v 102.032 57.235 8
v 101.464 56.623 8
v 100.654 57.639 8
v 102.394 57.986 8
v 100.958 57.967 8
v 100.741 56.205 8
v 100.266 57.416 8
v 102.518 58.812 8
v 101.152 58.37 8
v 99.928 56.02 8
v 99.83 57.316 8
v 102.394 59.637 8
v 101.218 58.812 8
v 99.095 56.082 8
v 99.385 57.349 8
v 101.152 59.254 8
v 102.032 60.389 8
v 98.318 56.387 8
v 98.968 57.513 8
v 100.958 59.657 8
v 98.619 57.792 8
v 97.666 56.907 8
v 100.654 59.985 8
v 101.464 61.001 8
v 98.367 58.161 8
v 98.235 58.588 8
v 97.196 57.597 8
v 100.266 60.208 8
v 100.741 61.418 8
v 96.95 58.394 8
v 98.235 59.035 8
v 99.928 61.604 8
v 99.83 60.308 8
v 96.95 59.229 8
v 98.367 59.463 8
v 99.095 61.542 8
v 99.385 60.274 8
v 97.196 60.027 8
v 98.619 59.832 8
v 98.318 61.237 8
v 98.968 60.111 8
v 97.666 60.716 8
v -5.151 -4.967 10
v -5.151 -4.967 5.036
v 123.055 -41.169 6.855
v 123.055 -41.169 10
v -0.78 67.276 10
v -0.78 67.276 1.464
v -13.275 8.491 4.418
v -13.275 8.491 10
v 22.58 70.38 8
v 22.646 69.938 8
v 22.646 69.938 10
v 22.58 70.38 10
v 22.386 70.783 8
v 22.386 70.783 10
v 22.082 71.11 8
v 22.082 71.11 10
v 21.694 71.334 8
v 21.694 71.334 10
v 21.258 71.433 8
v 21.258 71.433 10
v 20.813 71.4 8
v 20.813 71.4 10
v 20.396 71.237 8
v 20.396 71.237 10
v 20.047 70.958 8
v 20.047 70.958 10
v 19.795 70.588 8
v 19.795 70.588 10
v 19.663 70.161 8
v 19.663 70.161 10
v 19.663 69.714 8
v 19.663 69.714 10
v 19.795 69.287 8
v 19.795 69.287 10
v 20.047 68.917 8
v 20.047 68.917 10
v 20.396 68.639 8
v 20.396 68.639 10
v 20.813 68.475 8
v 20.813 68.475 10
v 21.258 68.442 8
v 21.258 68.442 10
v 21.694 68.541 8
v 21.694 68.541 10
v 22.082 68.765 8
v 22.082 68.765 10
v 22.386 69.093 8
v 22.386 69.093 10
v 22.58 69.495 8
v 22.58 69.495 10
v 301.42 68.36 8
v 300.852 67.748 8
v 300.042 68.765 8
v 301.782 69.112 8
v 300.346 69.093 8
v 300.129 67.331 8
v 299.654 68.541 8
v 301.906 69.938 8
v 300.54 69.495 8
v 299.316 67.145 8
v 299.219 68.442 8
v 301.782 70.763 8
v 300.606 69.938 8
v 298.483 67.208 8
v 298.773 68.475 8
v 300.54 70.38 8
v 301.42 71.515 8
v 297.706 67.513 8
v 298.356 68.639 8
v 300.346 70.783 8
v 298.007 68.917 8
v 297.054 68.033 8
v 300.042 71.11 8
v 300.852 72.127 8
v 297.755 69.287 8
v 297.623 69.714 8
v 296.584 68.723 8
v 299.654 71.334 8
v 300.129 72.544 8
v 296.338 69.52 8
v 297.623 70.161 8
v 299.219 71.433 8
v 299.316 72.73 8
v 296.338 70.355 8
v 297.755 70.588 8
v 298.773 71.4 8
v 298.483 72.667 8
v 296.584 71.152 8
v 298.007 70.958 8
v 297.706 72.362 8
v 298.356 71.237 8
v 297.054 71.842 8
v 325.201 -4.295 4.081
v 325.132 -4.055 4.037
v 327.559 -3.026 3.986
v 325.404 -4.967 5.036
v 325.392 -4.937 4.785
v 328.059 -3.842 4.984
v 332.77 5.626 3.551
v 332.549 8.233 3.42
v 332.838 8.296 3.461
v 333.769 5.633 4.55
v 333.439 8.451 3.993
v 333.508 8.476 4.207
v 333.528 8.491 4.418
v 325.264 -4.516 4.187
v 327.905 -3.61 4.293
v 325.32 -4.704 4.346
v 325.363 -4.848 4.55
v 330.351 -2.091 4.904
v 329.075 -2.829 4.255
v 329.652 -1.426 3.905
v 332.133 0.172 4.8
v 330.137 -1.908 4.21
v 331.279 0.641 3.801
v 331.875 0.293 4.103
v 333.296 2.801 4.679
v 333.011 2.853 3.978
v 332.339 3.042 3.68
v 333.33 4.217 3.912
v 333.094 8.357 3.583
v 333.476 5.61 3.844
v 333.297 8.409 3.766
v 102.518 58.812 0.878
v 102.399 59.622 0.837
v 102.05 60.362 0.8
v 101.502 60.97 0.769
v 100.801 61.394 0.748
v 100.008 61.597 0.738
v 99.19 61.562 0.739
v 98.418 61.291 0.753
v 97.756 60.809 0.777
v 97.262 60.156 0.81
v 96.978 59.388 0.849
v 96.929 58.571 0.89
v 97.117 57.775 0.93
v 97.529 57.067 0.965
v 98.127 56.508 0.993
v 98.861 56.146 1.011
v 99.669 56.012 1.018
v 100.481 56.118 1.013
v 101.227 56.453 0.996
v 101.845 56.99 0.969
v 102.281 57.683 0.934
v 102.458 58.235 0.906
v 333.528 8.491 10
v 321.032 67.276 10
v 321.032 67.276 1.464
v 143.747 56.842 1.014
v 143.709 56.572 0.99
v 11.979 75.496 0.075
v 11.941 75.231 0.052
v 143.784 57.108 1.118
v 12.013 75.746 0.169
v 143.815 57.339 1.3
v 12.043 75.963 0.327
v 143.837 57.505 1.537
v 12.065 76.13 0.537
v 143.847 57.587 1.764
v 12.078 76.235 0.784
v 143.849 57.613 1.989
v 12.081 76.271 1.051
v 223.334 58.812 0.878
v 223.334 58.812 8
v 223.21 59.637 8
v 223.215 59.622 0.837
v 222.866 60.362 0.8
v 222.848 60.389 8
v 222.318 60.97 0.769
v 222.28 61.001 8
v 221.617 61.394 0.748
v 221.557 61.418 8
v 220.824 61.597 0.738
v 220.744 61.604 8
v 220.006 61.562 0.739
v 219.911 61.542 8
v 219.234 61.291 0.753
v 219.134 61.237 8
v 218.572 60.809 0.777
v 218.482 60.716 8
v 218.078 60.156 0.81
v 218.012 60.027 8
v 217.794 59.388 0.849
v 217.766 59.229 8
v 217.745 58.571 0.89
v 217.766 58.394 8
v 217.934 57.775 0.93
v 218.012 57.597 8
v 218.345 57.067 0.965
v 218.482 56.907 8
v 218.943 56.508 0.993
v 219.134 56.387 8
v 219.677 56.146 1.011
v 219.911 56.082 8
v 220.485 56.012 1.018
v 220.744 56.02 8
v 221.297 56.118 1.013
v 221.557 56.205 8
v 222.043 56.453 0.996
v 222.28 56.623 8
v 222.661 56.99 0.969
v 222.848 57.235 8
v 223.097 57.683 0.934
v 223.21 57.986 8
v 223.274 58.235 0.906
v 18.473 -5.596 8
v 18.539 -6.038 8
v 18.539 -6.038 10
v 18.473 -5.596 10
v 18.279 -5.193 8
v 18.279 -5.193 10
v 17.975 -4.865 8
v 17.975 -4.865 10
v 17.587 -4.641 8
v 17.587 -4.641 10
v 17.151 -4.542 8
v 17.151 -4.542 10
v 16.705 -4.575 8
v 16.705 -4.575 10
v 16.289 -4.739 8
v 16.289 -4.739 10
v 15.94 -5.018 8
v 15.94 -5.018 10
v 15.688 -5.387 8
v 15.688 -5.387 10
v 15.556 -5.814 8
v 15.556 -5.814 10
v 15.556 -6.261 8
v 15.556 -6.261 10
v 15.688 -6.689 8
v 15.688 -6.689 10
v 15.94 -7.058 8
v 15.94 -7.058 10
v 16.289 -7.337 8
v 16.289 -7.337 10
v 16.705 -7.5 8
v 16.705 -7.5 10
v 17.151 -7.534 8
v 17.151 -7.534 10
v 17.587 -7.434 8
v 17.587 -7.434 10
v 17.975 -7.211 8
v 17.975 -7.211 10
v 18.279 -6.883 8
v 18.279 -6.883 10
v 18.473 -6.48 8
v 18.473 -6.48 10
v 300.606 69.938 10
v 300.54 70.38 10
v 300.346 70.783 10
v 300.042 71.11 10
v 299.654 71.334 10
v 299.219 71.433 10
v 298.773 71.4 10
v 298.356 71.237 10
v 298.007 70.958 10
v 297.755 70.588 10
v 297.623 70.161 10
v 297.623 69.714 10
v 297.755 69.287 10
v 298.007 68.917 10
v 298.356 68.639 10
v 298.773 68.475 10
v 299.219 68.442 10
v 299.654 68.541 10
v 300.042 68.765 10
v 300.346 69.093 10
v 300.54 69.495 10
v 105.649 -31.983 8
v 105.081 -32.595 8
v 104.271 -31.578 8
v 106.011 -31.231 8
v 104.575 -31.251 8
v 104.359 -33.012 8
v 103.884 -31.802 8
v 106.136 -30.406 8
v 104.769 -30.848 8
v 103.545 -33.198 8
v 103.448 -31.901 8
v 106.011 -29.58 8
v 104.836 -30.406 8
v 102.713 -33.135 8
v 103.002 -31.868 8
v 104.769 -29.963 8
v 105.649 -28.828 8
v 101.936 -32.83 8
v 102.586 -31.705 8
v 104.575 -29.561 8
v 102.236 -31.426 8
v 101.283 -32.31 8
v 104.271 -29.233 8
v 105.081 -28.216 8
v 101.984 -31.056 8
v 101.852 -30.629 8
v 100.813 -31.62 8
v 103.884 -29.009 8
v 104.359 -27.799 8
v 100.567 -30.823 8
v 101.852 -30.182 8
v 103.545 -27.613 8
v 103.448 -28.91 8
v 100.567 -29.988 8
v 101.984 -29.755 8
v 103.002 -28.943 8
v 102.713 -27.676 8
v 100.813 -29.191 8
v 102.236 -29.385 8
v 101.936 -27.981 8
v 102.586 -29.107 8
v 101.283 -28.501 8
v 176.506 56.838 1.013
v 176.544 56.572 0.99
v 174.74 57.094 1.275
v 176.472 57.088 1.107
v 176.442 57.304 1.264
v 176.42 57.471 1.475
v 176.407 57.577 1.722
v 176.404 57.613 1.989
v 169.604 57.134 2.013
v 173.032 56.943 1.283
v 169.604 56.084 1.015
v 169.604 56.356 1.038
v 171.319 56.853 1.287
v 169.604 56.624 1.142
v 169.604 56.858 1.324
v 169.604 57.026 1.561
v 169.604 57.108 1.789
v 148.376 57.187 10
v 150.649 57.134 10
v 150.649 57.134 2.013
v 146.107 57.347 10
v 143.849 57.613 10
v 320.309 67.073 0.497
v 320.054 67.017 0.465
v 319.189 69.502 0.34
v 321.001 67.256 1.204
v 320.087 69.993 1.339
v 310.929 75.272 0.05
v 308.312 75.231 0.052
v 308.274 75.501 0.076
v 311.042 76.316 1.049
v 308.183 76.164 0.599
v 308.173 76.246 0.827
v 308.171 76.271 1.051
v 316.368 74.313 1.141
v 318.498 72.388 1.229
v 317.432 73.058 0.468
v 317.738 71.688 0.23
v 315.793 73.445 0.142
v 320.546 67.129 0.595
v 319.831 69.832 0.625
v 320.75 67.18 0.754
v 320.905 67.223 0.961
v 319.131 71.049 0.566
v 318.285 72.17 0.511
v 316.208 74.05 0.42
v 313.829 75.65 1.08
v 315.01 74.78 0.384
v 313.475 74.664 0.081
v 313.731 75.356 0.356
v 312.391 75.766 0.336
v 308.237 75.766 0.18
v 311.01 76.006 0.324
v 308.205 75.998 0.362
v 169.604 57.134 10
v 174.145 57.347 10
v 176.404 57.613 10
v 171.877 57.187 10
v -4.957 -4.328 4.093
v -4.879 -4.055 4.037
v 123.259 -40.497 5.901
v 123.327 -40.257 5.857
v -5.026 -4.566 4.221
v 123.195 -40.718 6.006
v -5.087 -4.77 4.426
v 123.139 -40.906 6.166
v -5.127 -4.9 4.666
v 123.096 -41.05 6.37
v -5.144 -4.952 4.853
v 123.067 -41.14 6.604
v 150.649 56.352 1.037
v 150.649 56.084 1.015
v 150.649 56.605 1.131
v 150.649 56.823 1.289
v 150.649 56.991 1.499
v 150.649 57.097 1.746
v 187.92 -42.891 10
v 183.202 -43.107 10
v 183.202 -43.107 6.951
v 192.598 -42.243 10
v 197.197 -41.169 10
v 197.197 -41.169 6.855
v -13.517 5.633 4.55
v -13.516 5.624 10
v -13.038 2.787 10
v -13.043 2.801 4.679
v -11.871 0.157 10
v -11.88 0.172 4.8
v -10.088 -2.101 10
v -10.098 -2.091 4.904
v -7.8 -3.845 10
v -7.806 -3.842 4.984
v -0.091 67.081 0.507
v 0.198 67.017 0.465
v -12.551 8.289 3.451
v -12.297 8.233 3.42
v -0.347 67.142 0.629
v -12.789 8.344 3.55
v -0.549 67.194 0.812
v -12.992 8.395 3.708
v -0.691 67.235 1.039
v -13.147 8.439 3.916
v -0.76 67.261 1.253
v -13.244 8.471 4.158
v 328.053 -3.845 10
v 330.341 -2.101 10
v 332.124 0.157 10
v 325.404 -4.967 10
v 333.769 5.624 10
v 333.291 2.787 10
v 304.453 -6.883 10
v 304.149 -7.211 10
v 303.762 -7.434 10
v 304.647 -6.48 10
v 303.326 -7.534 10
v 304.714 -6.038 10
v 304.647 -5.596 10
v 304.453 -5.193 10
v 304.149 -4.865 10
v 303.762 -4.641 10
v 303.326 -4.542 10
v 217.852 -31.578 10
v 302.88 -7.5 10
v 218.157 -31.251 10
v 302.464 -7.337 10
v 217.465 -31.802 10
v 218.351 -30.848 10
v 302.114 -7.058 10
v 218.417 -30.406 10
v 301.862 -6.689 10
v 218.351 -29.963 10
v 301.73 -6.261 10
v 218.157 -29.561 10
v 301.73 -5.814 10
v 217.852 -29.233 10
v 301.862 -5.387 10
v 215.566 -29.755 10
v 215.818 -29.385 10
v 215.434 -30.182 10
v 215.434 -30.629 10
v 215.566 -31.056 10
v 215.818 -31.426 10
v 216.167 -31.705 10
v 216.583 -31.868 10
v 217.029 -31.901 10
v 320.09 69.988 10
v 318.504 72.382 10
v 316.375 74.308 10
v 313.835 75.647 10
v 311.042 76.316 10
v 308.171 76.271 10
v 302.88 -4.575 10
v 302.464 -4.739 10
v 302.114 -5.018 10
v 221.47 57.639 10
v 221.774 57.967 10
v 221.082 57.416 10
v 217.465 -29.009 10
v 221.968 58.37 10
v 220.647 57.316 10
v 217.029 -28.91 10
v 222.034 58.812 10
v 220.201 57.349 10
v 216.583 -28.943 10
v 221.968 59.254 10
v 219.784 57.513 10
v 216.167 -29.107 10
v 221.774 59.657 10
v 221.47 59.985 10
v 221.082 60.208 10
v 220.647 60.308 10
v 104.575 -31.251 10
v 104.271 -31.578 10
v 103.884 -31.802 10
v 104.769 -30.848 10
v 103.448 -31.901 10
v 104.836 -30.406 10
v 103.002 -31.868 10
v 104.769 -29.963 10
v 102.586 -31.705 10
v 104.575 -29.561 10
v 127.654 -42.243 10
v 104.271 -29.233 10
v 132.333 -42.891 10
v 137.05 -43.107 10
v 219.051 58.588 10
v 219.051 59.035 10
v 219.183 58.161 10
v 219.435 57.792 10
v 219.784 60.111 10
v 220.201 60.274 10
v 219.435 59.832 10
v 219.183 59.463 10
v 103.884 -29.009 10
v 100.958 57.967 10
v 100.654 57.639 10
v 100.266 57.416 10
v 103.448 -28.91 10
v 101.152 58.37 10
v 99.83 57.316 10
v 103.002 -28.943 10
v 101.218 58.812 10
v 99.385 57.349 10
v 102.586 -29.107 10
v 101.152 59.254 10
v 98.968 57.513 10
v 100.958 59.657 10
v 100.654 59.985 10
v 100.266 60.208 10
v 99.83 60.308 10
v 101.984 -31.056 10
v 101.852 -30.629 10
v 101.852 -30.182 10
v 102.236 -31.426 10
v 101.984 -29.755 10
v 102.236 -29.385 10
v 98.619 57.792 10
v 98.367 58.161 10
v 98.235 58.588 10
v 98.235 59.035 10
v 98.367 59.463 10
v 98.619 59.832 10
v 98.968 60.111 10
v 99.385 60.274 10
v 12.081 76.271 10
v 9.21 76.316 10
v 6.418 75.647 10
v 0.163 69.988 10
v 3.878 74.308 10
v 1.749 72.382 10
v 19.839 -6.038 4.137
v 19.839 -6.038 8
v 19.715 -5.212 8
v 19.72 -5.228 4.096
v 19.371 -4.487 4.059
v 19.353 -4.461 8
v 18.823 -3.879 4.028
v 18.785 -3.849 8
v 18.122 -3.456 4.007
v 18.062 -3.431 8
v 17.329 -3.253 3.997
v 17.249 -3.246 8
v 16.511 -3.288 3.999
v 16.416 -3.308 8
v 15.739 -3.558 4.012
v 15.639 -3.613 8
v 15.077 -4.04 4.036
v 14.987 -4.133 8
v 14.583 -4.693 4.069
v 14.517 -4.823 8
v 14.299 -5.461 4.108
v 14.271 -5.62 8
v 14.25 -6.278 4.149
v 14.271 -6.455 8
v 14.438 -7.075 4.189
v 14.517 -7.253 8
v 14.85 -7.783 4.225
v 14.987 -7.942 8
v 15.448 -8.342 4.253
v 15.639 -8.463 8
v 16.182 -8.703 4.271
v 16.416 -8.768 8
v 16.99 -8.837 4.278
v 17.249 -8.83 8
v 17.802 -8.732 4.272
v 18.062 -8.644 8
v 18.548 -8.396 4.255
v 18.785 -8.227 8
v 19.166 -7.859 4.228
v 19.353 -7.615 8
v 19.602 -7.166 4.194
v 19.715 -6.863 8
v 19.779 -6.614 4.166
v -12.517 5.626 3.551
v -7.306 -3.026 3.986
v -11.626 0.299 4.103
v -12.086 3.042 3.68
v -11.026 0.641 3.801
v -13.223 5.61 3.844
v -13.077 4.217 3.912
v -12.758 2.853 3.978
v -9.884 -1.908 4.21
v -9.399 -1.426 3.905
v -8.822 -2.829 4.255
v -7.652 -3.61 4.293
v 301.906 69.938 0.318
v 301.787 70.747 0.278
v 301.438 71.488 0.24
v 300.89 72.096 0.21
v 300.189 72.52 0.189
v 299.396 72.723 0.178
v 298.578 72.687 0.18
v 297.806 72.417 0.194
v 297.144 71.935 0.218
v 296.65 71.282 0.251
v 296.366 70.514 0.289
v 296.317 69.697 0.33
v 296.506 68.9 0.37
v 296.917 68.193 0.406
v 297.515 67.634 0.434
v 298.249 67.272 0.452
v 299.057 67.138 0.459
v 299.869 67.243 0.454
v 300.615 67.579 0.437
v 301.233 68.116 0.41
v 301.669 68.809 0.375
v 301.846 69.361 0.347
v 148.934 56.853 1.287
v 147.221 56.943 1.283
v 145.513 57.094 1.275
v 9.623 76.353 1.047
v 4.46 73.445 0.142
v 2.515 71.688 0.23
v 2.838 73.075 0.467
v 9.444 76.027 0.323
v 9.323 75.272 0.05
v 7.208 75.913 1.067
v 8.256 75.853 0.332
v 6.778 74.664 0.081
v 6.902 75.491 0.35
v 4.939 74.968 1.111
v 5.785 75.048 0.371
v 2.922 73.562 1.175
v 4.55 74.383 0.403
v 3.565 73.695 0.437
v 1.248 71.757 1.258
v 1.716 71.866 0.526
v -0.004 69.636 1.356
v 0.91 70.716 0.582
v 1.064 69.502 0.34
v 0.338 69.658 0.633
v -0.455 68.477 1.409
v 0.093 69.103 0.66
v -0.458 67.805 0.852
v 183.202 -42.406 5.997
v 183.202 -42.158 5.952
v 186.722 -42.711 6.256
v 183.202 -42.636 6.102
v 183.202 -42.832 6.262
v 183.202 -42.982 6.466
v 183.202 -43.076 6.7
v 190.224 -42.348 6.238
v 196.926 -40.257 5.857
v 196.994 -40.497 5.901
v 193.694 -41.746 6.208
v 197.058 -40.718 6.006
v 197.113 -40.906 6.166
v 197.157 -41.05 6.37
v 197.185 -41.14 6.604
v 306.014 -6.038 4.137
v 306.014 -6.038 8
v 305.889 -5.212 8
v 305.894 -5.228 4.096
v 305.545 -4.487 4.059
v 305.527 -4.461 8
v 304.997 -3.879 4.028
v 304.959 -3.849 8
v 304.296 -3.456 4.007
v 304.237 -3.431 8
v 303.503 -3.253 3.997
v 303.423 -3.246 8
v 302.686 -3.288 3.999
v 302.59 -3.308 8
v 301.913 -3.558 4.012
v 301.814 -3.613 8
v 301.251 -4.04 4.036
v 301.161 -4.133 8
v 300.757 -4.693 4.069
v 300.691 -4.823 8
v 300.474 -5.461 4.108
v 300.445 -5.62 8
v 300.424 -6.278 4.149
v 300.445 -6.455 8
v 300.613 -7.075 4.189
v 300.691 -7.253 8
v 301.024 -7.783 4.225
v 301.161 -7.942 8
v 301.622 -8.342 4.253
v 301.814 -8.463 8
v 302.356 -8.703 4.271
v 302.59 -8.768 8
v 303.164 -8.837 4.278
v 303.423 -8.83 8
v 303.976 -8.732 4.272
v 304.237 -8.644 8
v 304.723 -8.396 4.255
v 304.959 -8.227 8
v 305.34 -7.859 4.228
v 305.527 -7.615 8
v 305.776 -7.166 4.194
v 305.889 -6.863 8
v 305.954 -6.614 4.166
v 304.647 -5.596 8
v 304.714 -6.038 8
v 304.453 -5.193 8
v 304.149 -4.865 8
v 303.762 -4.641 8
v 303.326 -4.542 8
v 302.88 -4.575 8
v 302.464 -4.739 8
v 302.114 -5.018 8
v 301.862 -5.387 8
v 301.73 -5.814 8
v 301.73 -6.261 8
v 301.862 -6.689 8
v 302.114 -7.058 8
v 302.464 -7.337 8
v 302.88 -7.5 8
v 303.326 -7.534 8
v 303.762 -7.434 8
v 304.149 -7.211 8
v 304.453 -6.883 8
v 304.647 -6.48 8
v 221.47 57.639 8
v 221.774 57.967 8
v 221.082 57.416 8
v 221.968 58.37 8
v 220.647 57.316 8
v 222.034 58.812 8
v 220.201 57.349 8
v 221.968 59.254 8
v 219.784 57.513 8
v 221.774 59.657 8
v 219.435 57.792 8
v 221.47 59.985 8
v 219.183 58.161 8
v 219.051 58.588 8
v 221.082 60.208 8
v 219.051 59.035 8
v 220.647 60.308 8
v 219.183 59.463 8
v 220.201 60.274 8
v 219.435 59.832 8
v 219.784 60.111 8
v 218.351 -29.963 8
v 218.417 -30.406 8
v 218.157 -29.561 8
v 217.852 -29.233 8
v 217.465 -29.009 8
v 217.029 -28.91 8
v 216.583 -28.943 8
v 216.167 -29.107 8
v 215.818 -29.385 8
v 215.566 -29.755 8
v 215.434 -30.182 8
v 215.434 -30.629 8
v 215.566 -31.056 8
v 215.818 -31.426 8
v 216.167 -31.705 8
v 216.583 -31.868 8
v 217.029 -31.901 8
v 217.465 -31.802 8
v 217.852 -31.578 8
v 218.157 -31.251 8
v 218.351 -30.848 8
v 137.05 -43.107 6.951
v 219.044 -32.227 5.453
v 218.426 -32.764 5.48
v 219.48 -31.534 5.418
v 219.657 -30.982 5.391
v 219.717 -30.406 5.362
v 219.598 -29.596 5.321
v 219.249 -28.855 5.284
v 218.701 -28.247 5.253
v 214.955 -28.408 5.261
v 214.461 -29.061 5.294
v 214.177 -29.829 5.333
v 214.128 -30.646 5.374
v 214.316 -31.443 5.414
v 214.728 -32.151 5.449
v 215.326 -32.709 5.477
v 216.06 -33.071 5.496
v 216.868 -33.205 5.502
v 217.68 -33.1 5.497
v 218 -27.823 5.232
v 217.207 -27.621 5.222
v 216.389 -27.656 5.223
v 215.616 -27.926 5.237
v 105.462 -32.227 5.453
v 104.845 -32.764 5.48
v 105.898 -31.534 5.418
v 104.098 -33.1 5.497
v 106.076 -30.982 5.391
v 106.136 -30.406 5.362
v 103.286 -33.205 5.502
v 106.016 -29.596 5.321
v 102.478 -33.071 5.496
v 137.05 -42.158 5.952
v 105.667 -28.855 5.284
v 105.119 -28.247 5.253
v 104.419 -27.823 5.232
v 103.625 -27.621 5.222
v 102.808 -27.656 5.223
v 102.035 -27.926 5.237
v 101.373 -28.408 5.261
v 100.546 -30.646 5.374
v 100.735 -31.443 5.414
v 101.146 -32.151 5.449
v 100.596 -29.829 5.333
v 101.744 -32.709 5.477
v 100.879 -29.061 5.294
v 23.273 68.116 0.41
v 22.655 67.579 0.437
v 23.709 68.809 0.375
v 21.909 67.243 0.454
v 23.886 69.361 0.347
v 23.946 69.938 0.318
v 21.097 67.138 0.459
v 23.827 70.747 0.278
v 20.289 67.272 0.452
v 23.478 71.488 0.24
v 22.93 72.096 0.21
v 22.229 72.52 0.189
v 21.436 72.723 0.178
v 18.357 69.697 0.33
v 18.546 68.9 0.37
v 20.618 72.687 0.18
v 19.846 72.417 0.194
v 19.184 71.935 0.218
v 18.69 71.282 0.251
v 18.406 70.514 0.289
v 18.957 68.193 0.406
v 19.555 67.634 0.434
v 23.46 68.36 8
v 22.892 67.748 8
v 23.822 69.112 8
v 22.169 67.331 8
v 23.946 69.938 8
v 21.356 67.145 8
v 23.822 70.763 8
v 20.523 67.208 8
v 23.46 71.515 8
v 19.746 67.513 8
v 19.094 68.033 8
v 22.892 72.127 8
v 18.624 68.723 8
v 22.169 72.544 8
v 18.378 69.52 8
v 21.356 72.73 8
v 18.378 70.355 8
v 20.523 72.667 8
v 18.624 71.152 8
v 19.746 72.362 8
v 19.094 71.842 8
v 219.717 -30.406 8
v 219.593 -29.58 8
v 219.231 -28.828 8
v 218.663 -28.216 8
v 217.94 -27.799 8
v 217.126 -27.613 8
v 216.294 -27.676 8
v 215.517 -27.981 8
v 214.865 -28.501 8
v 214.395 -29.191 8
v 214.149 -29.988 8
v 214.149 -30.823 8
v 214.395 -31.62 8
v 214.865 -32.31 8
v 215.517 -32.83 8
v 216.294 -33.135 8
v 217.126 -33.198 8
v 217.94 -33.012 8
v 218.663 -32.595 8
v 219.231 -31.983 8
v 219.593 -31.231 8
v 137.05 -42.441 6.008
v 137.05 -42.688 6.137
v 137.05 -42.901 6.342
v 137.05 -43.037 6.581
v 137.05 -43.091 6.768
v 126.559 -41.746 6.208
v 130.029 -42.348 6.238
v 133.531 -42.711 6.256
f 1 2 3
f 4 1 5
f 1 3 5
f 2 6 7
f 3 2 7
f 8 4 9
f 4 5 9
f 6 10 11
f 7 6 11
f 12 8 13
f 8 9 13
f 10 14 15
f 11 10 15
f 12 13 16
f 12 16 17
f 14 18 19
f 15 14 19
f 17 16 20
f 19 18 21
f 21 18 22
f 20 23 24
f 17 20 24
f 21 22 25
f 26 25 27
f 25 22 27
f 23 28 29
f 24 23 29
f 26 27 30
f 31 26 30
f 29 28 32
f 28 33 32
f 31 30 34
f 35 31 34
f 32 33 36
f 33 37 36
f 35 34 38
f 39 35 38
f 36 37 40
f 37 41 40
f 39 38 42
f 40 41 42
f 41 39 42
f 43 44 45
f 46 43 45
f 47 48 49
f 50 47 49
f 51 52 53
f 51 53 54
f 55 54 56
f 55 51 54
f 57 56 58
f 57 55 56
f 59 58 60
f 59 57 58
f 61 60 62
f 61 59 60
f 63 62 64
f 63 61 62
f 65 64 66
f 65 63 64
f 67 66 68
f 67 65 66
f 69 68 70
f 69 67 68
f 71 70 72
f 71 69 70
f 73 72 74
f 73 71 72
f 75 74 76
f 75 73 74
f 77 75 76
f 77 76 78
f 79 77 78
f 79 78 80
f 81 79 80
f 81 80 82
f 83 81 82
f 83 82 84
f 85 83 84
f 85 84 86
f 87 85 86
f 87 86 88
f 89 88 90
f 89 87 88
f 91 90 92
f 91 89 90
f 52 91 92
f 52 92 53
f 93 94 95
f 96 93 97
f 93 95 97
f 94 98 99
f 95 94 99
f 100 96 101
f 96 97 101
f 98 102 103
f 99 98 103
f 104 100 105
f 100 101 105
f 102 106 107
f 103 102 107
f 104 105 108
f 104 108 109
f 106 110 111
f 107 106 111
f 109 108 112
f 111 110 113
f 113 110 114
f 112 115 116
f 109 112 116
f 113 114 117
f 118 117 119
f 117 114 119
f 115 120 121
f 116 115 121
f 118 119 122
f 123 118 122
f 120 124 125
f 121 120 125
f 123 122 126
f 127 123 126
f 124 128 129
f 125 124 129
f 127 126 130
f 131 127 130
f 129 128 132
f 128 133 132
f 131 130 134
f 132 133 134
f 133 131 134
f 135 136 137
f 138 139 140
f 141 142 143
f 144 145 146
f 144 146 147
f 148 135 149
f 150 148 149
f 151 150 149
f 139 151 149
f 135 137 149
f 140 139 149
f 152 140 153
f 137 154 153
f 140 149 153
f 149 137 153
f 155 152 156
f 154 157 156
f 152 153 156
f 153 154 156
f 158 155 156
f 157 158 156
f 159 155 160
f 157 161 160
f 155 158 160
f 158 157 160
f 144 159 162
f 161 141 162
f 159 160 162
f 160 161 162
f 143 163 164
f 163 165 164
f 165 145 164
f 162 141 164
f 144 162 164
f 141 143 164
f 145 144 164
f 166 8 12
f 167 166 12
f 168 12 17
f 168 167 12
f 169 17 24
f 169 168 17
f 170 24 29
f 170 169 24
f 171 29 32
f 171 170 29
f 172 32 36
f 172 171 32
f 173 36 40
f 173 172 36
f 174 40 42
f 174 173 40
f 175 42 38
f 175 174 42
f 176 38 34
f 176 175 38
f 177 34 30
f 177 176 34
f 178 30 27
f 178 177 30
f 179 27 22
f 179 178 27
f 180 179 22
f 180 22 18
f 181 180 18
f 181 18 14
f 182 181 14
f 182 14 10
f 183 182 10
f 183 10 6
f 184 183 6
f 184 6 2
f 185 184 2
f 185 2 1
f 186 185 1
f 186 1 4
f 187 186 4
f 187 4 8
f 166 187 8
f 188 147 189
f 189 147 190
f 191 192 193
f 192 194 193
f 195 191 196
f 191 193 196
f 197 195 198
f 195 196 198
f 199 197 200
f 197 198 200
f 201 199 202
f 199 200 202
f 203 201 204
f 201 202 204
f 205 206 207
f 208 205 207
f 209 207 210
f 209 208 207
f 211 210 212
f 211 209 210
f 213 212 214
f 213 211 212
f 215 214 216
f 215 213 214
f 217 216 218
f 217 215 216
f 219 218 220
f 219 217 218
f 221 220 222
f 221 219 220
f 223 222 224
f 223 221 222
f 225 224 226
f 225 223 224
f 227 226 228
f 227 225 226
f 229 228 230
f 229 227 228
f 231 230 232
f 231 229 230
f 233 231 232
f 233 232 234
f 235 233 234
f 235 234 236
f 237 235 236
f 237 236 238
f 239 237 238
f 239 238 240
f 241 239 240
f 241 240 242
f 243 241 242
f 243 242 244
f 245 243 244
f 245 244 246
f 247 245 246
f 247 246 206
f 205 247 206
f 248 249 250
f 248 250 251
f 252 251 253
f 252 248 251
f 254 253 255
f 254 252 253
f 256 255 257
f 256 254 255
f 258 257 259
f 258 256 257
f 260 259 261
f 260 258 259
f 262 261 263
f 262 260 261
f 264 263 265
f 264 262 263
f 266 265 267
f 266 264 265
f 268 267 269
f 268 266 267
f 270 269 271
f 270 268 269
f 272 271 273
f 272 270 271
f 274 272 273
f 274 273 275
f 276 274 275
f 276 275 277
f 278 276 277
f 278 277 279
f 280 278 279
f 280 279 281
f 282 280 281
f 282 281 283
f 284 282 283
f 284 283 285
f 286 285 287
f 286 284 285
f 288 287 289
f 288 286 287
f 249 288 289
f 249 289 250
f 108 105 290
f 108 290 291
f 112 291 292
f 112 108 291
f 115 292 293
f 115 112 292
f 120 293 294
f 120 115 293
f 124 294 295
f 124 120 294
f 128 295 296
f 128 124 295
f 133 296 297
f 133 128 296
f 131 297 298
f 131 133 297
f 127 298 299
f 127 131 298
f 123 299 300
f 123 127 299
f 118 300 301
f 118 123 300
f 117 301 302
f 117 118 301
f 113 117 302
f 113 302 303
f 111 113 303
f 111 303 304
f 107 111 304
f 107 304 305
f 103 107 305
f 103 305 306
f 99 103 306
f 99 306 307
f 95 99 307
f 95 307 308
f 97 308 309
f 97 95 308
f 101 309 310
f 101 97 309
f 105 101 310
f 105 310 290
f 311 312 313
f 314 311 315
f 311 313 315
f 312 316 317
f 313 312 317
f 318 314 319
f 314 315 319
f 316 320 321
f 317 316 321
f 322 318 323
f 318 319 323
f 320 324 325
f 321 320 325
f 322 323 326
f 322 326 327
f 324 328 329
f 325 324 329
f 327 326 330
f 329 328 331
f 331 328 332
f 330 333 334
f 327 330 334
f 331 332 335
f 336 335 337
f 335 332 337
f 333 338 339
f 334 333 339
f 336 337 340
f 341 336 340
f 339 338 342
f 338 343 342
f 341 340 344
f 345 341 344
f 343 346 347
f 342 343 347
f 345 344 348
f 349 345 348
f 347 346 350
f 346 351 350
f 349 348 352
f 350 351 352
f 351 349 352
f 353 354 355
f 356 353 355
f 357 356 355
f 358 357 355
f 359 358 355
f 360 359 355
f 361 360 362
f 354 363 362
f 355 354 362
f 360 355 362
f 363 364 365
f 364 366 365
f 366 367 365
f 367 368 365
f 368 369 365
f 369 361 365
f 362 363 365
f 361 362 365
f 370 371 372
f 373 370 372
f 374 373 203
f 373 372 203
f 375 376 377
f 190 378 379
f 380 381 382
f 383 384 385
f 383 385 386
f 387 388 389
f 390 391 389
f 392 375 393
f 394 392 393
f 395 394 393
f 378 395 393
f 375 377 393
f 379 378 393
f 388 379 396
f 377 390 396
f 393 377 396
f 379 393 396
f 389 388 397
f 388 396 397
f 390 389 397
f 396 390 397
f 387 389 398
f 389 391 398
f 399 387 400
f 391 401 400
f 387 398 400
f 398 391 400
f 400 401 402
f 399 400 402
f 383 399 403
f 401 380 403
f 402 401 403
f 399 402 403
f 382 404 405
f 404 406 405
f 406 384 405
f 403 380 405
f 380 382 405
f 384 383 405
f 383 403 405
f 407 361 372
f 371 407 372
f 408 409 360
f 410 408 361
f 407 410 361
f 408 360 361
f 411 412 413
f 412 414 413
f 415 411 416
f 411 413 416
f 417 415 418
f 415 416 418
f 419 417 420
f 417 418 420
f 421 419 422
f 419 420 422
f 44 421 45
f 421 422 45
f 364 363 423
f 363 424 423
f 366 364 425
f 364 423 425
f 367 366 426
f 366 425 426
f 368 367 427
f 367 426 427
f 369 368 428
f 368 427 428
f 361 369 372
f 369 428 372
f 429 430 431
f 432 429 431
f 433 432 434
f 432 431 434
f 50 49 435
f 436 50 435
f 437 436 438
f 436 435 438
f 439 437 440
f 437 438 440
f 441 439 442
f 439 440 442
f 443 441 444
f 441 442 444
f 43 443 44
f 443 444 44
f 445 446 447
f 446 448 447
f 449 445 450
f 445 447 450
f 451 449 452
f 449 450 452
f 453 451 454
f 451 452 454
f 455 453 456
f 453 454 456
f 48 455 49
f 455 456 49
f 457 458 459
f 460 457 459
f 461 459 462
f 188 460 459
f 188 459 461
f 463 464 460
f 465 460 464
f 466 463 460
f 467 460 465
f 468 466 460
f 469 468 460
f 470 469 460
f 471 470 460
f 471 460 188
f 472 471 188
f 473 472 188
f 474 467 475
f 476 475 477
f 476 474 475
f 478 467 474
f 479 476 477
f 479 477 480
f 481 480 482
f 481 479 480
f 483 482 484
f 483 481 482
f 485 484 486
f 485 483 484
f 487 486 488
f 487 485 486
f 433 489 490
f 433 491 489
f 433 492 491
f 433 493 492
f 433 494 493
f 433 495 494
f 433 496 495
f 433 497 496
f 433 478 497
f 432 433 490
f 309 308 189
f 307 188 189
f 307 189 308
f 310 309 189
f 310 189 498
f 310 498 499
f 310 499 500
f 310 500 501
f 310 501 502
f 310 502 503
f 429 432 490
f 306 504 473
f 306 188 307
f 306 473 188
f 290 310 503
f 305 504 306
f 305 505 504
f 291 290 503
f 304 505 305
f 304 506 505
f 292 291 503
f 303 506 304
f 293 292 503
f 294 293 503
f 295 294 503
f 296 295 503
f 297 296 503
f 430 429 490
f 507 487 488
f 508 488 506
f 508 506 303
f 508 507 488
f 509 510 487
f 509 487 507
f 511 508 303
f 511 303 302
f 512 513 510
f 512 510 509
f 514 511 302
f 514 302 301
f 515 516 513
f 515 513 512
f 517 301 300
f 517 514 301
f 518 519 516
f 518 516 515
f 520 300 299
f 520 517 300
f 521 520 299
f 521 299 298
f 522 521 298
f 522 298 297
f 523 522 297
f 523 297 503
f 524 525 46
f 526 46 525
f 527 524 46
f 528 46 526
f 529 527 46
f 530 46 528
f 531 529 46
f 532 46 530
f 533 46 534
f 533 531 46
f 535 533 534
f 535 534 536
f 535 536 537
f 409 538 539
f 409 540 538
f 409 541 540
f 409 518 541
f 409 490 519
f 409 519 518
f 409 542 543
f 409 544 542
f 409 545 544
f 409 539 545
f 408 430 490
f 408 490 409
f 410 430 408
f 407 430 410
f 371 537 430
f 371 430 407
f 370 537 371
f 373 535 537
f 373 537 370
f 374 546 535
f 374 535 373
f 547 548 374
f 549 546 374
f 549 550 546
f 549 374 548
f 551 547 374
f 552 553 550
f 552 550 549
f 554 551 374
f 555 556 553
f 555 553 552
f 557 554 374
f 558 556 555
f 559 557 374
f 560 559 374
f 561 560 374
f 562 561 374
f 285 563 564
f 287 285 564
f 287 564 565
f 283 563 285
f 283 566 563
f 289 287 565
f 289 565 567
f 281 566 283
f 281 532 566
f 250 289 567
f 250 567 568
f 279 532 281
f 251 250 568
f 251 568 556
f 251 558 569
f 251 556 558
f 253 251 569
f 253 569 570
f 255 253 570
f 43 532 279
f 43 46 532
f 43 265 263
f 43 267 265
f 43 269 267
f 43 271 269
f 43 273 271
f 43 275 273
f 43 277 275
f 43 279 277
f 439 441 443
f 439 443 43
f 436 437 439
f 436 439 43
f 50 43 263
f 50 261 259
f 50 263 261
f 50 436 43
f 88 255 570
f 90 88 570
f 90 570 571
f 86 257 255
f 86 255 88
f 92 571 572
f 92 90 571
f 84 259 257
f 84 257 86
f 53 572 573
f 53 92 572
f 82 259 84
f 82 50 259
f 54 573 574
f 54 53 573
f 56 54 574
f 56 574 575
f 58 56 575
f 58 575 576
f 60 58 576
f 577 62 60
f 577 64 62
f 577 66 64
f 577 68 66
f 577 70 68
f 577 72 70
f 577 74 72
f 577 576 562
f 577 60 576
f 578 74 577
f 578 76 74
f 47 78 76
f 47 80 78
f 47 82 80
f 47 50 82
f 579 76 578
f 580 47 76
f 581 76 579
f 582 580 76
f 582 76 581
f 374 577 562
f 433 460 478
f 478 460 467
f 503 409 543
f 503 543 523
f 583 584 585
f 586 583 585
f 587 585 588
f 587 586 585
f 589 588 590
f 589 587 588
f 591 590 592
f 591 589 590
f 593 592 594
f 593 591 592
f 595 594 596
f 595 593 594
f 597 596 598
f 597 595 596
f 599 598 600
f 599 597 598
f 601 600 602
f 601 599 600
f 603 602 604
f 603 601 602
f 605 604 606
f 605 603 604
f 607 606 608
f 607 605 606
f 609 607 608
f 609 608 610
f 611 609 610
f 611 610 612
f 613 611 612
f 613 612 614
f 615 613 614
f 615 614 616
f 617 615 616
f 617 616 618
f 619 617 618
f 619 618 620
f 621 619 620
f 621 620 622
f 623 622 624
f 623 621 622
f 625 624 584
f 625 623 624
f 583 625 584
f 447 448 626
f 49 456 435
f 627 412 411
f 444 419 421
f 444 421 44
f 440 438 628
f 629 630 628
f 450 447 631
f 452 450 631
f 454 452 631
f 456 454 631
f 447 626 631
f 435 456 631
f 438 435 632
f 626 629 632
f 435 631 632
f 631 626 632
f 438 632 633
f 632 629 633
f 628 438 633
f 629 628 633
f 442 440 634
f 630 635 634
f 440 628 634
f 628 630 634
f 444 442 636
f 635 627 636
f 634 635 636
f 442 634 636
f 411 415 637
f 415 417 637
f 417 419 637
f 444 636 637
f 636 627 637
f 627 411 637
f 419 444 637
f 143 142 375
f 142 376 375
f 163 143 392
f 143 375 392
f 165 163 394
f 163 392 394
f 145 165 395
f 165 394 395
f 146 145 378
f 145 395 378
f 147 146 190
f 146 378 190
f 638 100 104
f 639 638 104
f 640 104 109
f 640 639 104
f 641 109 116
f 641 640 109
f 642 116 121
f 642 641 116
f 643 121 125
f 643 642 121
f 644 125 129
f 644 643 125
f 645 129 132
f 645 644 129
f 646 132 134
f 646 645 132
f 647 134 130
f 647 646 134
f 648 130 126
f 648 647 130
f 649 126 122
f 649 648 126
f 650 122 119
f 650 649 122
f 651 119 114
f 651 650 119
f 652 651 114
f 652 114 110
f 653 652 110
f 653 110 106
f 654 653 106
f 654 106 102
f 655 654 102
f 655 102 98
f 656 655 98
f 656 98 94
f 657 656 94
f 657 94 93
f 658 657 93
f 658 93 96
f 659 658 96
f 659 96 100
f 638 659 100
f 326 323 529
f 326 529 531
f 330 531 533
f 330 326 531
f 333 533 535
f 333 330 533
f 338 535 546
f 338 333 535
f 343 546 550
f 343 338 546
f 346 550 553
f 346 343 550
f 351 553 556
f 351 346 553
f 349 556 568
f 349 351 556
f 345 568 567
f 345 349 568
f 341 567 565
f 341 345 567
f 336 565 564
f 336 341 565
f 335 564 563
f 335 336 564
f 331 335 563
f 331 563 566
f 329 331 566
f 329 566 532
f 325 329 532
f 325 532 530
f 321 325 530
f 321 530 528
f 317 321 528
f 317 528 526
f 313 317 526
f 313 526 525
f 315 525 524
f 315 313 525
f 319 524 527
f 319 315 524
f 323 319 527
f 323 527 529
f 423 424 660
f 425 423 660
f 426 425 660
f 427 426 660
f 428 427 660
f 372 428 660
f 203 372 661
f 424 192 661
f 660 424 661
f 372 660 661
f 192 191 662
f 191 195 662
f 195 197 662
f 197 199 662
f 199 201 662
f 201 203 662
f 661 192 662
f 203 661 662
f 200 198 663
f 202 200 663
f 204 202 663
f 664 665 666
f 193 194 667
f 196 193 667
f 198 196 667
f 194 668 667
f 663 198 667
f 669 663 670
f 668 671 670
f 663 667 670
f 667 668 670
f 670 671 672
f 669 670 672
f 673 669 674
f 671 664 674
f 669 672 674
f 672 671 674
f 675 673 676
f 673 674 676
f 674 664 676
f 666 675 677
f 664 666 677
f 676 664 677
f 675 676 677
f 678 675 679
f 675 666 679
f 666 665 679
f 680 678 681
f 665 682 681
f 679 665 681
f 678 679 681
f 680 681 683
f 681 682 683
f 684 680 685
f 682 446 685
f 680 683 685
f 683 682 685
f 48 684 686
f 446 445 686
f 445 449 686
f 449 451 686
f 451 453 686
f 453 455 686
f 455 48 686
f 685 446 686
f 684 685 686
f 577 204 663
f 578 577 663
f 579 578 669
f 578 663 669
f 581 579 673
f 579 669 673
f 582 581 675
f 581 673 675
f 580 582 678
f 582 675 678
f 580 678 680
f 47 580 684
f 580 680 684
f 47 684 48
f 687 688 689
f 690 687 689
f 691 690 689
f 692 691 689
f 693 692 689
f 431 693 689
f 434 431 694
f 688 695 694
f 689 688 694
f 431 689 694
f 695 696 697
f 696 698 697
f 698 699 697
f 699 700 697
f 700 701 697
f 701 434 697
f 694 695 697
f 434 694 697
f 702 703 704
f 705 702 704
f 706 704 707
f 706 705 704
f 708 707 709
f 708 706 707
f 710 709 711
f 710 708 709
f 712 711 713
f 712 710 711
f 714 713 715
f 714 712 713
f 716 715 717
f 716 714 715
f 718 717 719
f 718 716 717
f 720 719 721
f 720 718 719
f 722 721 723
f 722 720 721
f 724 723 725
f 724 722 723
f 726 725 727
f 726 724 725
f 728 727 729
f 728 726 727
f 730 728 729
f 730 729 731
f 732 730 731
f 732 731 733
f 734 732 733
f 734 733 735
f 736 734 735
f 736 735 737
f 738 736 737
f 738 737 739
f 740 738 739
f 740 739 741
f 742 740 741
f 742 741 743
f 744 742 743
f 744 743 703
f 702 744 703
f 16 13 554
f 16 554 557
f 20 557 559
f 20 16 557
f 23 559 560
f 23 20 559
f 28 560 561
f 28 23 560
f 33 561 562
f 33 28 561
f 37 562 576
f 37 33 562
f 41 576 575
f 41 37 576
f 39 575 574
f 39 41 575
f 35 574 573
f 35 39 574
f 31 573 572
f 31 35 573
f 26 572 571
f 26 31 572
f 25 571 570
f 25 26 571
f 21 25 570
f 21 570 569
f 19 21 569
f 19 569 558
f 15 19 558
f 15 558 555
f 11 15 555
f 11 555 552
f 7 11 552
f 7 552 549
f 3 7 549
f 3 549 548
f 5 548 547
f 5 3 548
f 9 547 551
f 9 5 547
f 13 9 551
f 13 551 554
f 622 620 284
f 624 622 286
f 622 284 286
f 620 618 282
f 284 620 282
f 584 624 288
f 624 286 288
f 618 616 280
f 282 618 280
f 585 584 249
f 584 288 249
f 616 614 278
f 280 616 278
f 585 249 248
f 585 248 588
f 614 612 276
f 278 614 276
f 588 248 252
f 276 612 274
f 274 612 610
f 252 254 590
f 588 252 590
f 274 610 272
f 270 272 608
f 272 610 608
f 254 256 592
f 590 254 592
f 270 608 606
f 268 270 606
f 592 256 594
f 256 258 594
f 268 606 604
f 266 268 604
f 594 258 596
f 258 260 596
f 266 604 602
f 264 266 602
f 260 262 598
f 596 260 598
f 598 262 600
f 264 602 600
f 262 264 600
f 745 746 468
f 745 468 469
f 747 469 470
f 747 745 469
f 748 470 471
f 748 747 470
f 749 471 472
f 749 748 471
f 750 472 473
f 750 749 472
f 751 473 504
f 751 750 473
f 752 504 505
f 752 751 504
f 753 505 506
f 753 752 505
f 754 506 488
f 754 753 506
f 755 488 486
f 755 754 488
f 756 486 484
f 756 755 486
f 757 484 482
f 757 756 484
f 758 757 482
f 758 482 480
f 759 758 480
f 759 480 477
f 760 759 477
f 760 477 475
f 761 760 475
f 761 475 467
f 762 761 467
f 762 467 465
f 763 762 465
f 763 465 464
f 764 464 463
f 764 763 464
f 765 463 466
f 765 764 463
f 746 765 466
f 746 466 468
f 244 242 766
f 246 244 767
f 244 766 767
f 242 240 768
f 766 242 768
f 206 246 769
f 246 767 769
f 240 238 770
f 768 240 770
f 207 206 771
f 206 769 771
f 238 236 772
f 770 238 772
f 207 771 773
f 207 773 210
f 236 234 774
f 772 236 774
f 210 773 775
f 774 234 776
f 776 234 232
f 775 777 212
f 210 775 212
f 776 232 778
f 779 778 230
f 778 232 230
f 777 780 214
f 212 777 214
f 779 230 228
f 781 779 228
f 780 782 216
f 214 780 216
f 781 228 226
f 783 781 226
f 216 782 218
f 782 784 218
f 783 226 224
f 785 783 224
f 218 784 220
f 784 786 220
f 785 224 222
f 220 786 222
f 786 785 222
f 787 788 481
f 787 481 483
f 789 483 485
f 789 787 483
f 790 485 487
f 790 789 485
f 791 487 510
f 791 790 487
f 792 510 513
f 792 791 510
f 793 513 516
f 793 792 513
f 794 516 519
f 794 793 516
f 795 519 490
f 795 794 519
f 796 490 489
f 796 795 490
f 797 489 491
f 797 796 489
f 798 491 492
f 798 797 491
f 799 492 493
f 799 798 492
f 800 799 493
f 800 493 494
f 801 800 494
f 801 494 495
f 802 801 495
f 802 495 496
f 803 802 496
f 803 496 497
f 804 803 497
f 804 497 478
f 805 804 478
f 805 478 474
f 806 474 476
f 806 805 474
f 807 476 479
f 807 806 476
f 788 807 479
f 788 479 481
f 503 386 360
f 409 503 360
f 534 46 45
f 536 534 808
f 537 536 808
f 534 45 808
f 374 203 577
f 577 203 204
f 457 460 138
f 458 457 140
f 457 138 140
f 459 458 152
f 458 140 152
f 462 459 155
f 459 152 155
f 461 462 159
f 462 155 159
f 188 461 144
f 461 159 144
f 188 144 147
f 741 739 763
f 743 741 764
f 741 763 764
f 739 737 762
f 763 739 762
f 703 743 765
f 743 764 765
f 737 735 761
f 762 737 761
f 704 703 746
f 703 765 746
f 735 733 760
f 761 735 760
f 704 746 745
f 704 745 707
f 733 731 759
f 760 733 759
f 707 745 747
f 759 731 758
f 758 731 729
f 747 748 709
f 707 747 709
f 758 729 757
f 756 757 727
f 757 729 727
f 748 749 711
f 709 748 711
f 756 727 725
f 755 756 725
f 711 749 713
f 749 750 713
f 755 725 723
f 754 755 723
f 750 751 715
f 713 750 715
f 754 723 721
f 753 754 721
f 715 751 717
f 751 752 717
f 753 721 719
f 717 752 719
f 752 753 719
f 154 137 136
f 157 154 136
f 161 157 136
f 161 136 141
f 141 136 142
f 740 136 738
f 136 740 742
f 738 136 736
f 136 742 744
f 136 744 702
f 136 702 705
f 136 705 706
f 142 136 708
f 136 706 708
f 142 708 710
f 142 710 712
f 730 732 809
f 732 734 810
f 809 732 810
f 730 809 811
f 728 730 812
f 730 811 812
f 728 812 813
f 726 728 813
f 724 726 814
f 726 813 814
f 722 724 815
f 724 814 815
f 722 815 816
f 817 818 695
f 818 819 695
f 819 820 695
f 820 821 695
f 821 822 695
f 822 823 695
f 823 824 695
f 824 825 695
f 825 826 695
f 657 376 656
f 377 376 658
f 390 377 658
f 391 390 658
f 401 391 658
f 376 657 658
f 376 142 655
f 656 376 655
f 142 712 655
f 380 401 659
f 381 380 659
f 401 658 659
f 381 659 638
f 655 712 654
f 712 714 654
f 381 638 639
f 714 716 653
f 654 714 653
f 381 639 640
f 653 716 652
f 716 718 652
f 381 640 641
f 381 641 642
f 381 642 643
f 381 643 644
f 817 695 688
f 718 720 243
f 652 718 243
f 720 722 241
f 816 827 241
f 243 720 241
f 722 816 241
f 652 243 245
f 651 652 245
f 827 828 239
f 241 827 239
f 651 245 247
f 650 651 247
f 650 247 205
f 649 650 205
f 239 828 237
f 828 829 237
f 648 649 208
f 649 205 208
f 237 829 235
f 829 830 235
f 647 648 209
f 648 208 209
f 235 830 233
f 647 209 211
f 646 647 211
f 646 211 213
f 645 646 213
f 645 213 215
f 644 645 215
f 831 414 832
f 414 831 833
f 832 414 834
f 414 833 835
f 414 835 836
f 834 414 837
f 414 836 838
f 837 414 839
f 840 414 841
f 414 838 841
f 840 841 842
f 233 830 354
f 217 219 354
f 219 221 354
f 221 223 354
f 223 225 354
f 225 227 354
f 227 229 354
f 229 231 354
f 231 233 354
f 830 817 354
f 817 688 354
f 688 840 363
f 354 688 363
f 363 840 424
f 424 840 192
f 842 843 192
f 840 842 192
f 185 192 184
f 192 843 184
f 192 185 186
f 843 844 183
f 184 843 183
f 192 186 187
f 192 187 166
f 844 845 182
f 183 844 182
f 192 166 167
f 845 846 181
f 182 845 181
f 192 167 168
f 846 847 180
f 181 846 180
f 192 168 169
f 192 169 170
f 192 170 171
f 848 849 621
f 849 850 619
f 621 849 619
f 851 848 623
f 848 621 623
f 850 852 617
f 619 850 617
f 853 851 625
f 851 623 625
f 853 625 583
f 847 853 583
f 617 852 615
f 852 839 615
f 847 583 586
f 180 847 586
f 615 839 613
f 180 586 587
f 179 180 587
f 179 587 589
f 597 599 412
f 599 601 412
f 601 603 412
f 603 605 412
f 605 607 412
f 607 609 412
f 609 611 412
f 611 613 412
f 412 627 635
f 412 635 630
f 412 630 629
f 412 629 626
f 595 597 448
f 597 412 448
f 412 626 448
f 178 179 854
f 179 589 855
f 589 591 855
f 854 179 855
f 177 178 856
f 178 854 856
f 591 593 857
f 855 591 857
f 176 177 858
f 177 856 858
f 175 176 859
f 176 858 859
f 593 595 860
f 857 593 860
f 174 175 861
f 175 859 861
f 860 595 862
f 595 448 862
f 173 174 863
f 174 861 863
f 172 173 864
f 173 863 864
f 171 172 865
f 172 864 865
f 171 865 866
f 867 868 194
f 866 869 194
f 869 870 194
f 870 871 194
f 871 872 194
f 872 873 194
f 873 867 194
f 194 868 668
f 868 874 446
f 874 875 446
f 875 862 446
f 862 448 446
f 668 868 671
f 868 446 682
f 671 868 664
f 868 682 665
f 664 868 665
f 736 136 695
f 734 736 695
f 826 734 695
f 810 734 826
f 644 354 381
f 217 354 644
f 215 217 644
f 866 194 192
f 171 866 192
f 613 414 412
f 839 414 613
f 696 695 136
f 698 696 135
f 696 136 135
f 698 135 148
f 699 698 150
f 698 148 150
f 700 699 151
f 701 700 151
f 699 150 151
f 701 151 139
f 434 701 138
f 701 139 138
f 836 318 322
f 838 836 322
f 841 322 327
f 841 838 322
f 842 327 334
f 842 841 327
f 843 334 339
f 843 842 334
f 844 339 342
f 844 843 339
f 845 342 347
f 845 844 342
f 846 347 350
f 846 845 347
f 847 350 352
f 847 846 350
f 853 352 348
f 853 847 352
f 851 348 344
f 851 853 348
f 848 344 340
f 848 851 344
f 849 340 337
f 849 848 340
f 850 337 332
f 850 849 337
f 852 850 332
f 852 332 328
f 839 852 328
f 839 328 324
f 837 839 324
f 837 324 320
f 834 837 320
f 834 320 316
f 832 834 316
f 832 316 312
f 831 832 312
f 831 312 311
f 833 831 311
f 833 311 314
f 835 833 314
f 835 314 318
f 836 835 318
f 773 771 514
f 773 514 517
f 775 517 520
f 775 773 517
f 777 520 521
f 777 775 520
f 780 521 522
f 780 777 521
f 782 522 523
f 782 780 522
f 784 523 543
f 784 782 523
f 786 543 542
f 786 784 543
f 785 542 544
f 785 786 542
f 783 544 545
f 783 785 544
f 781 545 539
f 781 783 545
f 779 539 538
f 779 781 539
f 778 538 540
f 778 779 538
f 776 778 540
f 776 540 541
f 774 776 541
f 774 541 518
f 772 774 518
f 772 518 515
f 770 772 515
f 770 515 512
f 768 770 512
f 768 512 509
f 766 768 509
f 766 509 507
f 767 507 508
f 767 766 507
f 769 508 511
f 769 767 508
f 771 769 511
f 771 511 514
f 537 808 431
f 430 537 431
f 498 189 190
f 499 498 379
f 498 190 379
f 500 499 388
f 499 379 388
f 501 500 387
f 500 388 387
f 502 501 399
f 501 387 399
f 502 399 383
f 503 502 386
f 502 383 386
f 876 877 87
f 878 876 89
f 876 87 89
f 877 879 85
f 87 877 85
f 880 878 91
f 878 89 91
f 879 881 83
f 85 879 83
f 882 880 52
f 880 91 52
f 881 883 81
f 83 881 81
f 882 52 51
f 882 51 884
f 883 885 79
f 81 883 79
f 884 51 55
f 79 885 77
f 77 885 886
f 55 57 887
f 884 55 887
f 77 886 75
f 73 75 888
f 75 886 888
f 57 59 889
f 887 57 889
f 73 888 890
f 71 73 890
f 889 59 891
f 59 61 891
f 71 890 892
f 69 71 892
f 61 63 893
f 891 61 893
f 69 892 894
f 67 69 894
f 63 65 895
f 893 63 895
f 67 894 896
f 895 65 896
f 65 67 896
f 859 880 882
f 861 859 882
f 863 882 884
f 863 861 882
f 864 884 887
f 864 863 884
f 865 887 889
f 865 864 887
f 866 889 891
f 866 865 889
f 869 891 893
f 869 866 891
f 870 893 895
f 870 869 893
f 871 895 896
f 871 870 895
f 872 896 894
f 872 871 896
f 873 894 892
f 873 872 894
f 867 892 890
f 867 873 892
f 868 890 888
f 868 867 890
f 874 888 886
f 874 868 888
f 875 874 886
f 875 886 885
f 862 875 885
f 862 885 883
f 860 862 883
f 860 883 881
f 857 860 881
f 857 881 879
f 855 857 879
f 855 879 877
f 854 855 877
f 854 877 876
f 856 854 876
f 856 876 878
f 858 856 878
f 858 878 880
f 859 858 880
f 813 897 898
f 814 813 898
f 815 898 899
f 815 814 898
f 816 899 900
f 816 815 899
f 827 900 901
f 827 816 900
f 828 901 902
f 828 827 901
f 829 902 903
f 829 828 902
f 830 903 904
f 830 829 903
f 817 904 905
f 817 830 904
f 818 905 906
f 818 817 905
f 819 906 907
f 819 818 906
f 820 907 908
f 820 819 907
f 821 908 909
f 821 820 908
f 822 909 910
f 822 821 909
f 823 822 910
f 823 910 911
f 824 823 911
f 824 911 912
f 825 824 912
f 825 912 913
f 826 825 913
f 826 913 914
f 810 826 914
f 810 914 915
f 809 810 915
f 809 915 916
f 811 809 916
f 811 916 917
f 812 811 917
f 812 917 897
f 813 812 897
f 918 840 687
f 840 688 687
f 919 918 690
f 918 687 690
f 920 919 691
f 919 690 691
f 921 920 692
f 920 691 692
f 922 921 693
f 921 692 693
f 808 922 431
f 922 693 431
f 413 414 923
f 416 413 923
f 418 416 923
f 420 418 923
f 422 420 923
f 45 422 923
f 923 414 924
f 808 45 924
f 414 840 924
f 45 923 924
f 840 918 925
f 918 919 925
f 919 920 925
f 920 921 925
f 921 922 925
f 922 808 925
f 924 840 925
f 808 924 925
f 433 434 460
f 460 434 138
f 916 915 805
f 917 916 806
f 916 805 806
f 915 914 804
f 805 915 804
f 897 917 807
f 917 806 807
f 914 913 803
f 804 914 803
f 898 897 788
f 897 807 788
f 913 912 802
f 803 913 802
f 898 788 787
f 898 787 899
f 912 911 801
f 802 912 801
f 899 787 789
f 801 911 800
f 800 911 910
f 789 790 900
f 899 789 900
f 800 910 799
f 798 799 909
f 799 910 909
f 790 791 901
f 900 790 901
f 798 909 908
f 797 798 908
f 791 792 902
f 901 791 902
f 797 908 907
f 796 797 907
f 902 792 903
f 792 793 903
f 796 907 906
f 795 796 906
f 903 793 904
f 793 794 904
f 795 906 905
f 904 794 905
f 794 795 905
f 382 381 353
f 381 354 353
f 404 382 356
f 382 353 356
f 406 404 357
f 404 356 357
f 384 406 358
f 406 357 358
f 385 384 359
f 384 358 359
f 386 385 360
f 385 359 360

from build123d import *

# Parameters (mm, degrees)
MODEL_R                 = 2.8
BOSS_EXTRUDE1_DEPTH     = 10
CUT_EXTRUDE1_DEPTH      = 343.553555131
CUT_EXTRUDE1_DEPTH_BACK = 343.553555131
BOSS_EXTRUDE2_START     = 8
MODEL_3_R               = 2.8
MODEL_3_R_2             = 1.5
BOSS_EXTRUDE2_DEPTH     = 2
FILLET1_R               = 1


with BuildPart() as part:
    # Model → Boss-Extrude1 (new body)
    with BuildSketch(Plane.XY):
        with BuildLine():
            ThreePointArc((176.403737975, 57.612801897), (173.012294783, 57.253677545), (169.603999044, 57.1337718))
            Line((169.603999044, 57.1337718), (150.648829756, 57.1337718))
            ThreePointArc((150.648829756, 57.1337718), (147.240534017, 57.253677545), (143.849090824, 57.612801897))
            Line((143.849090824, 57.612801897), (12.081352867, 76.271030157))
            ThreePointArc((12.081352867, 76.271030157), (3.877804033, 74.308284837), (-0.779653775, 67.275599046))
            Line((-0.779653775, 67.275599046), (-13.274730709, 8.490883588))
            ThreePointArc((-13.274730709, 8.490883588), (-11.871459071, 0.157038619), (-5.151125733, -4.967340667))
            Line((-5.151125733, -4.967340667), (123.055393281, -41.169431628))
            ThreePointArc((123.055393281, -41.169431628), (129.986107868, -42.620640598), (137.050372447, -43.1074446))
            Line((137.050372447, -43.1074446), (183.202456353, -43.1074446))
            ThreePointArc((183.202456353, -43.1074446), (190.266720932, -42.620640598), (197.197435519, -41.169431628))
            Line((197.197435519, -41.169431628), (325.403954533, -4.967340667))
            ThreePointArc((325.403954533, -4.967340667), (332.124287871, 0.157038619), (333.527559509, 8.490883588))
            Line((333.527559509, 8.490883588), (321.032482575, 67.275599045))
            ThreePointArc((321.032482575, 67.275599045), (316.375024767, 74.308284836), (308.171475933, 76.271030156))
            Line((308.171475933, 76.271030156), (176.403737975, 57.612801897))
        make_face()
        with Locations((103.335575354, -30.405568574)):
            Circle(MODEL_R, mode=Mode.SUBTRACT)
        with Locations((17.039281052, -6.037803815)):
            Circle(MODEL_R, mode=Mode.SUBTRACT)
        with Locations((216.917253446, -30.405568574)):
            Circle(MODEL_R, mode=Mode.SUBTRACT)
        with Locations((303.213547748, -6.037803815)):
            Circle(MODEL_R, mode=Mode.SUBTRACT)
        with Locations((21.146353911, 69.937554571)):
            Circle(MODEL_R, mode=Mode.SUBTRACT)
        with Locations((99.718342652, 58.811810716)):
            Circle(MODEL_R, mode=Mode.SUBTRACT)
        with Locations((220.534486148, 58.811810716)):
            Circle(MODEL_R, mode=Mode.SUBTRACT)
        with Locations((299.10647489, 69.93755457)):
            Circle(MODEL_R, mode=Mode.SUBTRACT)
    extrude(amount=BOSS_EXTRUDE1_DEPTH)

    # Sketch2 → Cut-Extrude1 (cut, two sides: drawn at the far end of the back side and taken through both)
    with BuildSketch(Plane(origin=(0, 0, 0), x_dir=(0, 0, -1), z_dir=(1, 0, 0)).offset(-CUT_EXTRUDE1_DEPTH_BACK)):
        Polygon((0, -43.1074446), (-6, -43.1074446), (0, 76.271030156), align=None)
    extrude(amount=CUT_EXTRUDE1_DEPTH + CUT_EXTRUDE1_DEPTH_BACK, mode=Mode.SUBTRACT)

    # Model<3> → Boss-Extrude2 (add)
    # profile 1 of 8: a face of its own
    with BuildSketch(Plane.XY.offset(BOSS_EXTRUDE2_START)):
        with Locations(Location((17.039281052, -6.037803815, 0), (0, 0, 90))):
            Circle(MODEL_3_R)
        with Locations((17.039281052, -6.037803815)):
            Circle(MODEL_3_R_2, mode=Mode.SUBTRACT)
    # profile 2 of 8: a face of its own
    with BuildSketch(Plane.XY.offset(BOSS_EXTRUDE2_START)):
        with Locations(Location((103.335575354, -30.405568574, 0), (0, 0, 90))):
            Circle(MODEL_3_R)
        with Locations((103.335575354, -30.405568574)):
            Circle(MODEL_3_R_2, mode=Mode.SUBTRACT)
    # profile 3 of 8: a face of its own
    with BuildSketch(Plane.XY.offset(BOSS_EXTRUDE2_START)):
        with Locations(Location((216.917253446, -30.405568574, 0), (0, 0, 90))):
            Circle(MODEL_3_R)
        with Locations((216.917253446, -30.405568574)):
            Circle(MODEL_3_R_2, mode=Mode.SUBTRACT)
    # profile 4 of 8: a face of its own
    with BuildSketch(Plane.XY.offset(BOSS_EXTRUDE2_START)):
        with Locations(Location((303.213547748, -6.037803815, 0), (0, 0, 90))):
            Circle(MODEL_3_R)
        with Locations((303.213547748, -6.037803815)):
            Circle(MODEL_3_R_2, mode=Mode.SUBTRACT)
    # profile 5 of 8: a face of its own
    with BuildSketch(Plane.XY.offset(BOSS_EXTRUDE2_START)):
        with Locations(Location((299.10647489, 69.93755457, 0), (0, 0, 90))):
            Circle(MODEL_3_R)
        with Locations((299.10647489, 69.93755457)):
            Circle(MODEL_3_R_2, mode=Mode.SUBTRACT)
    # profile 6 of 8: a face of its own
    with BuildSketch(Plane.XY.offset(BOSS_EXTRUDE2_START)):
        with Locations(Location((220.534486148, 58.811810716, 0), (0, 0, 90))):
            Circle(MODEL_3_R)
        with Locations((220.534486148, 58.811810716)):
            Circle(MODEL_3_R_2, mode=Mode.SUBTRACT)
    # profile 7 of 8: a face of its own
    with BuildSketch(Plane.XY.offset(BOSS_EXTRUDE2_START)):
        with Locations(Location((99.718342652, 58.811810716, 0), (0, 0, 90))):
            Circle(MODEL_3_R)
        with Locations((99.718342652, 58.811810716)):
            Circle(MODEL_3_R_2, mode=Mode.SUBTRACT)
    # profile 8 of 8: a face of its own
    with BuildSketch(Plane.XY.offset(BOSS_EXTRUDE2_START)):
        with Locations(Location((21.146353911, 69.937554571, 0), (0, 0, 90))):
            Circle(MODEL_3_R)
        with Locations((21.146353911, 69.937554571)):
            Circle(MODEL_3_R_2, mode=Mode.SUBTRACT)
    extrude(amount=BOSS_EXTRUDE2_DEPTH)

    # Fillet1
    fillet1_edges = [part.edges().sort_by_distance(p)[0] for p in [
        (190.266885646, -42.620617789, 5.97553193),
        (160.1264144, -43.1074446, 6),
        (129.985943154, -42.620617789, 5.97553193),
        (58.952133774, -23.068386147, 4.992830567),
        (-11.873007386, 0.159604439, 3.825384394),
        (-7.027192242, 37.883241317, 1.929382441),
        (2.619961345, 73.289488627, 0.149853223),
        (77.96522185, 66.941916026, 0.468884235),
        (147.240512863, 57.253679035, 0.955818098),
        (160.1264144, 57.1337718, 0.961844674),
        (173.012315937, 57.253679035, 0.955818098),
        (242.287606954, 66.941916026, 0.468884235),
        (309.783785164, 76.384614612, 0),
        (317.632867453, 73.289488628, 0.149853223),
        (327.280021042, 37.883241316, 1.929382441),
        (332.125836186, 0.159604439, 3.825384394),
        (261.300695026, -23.068386147, 4.992830567),
    ]]
    fillet(fillet1_edges, radius=FILLET1_R)


solid = part.part
